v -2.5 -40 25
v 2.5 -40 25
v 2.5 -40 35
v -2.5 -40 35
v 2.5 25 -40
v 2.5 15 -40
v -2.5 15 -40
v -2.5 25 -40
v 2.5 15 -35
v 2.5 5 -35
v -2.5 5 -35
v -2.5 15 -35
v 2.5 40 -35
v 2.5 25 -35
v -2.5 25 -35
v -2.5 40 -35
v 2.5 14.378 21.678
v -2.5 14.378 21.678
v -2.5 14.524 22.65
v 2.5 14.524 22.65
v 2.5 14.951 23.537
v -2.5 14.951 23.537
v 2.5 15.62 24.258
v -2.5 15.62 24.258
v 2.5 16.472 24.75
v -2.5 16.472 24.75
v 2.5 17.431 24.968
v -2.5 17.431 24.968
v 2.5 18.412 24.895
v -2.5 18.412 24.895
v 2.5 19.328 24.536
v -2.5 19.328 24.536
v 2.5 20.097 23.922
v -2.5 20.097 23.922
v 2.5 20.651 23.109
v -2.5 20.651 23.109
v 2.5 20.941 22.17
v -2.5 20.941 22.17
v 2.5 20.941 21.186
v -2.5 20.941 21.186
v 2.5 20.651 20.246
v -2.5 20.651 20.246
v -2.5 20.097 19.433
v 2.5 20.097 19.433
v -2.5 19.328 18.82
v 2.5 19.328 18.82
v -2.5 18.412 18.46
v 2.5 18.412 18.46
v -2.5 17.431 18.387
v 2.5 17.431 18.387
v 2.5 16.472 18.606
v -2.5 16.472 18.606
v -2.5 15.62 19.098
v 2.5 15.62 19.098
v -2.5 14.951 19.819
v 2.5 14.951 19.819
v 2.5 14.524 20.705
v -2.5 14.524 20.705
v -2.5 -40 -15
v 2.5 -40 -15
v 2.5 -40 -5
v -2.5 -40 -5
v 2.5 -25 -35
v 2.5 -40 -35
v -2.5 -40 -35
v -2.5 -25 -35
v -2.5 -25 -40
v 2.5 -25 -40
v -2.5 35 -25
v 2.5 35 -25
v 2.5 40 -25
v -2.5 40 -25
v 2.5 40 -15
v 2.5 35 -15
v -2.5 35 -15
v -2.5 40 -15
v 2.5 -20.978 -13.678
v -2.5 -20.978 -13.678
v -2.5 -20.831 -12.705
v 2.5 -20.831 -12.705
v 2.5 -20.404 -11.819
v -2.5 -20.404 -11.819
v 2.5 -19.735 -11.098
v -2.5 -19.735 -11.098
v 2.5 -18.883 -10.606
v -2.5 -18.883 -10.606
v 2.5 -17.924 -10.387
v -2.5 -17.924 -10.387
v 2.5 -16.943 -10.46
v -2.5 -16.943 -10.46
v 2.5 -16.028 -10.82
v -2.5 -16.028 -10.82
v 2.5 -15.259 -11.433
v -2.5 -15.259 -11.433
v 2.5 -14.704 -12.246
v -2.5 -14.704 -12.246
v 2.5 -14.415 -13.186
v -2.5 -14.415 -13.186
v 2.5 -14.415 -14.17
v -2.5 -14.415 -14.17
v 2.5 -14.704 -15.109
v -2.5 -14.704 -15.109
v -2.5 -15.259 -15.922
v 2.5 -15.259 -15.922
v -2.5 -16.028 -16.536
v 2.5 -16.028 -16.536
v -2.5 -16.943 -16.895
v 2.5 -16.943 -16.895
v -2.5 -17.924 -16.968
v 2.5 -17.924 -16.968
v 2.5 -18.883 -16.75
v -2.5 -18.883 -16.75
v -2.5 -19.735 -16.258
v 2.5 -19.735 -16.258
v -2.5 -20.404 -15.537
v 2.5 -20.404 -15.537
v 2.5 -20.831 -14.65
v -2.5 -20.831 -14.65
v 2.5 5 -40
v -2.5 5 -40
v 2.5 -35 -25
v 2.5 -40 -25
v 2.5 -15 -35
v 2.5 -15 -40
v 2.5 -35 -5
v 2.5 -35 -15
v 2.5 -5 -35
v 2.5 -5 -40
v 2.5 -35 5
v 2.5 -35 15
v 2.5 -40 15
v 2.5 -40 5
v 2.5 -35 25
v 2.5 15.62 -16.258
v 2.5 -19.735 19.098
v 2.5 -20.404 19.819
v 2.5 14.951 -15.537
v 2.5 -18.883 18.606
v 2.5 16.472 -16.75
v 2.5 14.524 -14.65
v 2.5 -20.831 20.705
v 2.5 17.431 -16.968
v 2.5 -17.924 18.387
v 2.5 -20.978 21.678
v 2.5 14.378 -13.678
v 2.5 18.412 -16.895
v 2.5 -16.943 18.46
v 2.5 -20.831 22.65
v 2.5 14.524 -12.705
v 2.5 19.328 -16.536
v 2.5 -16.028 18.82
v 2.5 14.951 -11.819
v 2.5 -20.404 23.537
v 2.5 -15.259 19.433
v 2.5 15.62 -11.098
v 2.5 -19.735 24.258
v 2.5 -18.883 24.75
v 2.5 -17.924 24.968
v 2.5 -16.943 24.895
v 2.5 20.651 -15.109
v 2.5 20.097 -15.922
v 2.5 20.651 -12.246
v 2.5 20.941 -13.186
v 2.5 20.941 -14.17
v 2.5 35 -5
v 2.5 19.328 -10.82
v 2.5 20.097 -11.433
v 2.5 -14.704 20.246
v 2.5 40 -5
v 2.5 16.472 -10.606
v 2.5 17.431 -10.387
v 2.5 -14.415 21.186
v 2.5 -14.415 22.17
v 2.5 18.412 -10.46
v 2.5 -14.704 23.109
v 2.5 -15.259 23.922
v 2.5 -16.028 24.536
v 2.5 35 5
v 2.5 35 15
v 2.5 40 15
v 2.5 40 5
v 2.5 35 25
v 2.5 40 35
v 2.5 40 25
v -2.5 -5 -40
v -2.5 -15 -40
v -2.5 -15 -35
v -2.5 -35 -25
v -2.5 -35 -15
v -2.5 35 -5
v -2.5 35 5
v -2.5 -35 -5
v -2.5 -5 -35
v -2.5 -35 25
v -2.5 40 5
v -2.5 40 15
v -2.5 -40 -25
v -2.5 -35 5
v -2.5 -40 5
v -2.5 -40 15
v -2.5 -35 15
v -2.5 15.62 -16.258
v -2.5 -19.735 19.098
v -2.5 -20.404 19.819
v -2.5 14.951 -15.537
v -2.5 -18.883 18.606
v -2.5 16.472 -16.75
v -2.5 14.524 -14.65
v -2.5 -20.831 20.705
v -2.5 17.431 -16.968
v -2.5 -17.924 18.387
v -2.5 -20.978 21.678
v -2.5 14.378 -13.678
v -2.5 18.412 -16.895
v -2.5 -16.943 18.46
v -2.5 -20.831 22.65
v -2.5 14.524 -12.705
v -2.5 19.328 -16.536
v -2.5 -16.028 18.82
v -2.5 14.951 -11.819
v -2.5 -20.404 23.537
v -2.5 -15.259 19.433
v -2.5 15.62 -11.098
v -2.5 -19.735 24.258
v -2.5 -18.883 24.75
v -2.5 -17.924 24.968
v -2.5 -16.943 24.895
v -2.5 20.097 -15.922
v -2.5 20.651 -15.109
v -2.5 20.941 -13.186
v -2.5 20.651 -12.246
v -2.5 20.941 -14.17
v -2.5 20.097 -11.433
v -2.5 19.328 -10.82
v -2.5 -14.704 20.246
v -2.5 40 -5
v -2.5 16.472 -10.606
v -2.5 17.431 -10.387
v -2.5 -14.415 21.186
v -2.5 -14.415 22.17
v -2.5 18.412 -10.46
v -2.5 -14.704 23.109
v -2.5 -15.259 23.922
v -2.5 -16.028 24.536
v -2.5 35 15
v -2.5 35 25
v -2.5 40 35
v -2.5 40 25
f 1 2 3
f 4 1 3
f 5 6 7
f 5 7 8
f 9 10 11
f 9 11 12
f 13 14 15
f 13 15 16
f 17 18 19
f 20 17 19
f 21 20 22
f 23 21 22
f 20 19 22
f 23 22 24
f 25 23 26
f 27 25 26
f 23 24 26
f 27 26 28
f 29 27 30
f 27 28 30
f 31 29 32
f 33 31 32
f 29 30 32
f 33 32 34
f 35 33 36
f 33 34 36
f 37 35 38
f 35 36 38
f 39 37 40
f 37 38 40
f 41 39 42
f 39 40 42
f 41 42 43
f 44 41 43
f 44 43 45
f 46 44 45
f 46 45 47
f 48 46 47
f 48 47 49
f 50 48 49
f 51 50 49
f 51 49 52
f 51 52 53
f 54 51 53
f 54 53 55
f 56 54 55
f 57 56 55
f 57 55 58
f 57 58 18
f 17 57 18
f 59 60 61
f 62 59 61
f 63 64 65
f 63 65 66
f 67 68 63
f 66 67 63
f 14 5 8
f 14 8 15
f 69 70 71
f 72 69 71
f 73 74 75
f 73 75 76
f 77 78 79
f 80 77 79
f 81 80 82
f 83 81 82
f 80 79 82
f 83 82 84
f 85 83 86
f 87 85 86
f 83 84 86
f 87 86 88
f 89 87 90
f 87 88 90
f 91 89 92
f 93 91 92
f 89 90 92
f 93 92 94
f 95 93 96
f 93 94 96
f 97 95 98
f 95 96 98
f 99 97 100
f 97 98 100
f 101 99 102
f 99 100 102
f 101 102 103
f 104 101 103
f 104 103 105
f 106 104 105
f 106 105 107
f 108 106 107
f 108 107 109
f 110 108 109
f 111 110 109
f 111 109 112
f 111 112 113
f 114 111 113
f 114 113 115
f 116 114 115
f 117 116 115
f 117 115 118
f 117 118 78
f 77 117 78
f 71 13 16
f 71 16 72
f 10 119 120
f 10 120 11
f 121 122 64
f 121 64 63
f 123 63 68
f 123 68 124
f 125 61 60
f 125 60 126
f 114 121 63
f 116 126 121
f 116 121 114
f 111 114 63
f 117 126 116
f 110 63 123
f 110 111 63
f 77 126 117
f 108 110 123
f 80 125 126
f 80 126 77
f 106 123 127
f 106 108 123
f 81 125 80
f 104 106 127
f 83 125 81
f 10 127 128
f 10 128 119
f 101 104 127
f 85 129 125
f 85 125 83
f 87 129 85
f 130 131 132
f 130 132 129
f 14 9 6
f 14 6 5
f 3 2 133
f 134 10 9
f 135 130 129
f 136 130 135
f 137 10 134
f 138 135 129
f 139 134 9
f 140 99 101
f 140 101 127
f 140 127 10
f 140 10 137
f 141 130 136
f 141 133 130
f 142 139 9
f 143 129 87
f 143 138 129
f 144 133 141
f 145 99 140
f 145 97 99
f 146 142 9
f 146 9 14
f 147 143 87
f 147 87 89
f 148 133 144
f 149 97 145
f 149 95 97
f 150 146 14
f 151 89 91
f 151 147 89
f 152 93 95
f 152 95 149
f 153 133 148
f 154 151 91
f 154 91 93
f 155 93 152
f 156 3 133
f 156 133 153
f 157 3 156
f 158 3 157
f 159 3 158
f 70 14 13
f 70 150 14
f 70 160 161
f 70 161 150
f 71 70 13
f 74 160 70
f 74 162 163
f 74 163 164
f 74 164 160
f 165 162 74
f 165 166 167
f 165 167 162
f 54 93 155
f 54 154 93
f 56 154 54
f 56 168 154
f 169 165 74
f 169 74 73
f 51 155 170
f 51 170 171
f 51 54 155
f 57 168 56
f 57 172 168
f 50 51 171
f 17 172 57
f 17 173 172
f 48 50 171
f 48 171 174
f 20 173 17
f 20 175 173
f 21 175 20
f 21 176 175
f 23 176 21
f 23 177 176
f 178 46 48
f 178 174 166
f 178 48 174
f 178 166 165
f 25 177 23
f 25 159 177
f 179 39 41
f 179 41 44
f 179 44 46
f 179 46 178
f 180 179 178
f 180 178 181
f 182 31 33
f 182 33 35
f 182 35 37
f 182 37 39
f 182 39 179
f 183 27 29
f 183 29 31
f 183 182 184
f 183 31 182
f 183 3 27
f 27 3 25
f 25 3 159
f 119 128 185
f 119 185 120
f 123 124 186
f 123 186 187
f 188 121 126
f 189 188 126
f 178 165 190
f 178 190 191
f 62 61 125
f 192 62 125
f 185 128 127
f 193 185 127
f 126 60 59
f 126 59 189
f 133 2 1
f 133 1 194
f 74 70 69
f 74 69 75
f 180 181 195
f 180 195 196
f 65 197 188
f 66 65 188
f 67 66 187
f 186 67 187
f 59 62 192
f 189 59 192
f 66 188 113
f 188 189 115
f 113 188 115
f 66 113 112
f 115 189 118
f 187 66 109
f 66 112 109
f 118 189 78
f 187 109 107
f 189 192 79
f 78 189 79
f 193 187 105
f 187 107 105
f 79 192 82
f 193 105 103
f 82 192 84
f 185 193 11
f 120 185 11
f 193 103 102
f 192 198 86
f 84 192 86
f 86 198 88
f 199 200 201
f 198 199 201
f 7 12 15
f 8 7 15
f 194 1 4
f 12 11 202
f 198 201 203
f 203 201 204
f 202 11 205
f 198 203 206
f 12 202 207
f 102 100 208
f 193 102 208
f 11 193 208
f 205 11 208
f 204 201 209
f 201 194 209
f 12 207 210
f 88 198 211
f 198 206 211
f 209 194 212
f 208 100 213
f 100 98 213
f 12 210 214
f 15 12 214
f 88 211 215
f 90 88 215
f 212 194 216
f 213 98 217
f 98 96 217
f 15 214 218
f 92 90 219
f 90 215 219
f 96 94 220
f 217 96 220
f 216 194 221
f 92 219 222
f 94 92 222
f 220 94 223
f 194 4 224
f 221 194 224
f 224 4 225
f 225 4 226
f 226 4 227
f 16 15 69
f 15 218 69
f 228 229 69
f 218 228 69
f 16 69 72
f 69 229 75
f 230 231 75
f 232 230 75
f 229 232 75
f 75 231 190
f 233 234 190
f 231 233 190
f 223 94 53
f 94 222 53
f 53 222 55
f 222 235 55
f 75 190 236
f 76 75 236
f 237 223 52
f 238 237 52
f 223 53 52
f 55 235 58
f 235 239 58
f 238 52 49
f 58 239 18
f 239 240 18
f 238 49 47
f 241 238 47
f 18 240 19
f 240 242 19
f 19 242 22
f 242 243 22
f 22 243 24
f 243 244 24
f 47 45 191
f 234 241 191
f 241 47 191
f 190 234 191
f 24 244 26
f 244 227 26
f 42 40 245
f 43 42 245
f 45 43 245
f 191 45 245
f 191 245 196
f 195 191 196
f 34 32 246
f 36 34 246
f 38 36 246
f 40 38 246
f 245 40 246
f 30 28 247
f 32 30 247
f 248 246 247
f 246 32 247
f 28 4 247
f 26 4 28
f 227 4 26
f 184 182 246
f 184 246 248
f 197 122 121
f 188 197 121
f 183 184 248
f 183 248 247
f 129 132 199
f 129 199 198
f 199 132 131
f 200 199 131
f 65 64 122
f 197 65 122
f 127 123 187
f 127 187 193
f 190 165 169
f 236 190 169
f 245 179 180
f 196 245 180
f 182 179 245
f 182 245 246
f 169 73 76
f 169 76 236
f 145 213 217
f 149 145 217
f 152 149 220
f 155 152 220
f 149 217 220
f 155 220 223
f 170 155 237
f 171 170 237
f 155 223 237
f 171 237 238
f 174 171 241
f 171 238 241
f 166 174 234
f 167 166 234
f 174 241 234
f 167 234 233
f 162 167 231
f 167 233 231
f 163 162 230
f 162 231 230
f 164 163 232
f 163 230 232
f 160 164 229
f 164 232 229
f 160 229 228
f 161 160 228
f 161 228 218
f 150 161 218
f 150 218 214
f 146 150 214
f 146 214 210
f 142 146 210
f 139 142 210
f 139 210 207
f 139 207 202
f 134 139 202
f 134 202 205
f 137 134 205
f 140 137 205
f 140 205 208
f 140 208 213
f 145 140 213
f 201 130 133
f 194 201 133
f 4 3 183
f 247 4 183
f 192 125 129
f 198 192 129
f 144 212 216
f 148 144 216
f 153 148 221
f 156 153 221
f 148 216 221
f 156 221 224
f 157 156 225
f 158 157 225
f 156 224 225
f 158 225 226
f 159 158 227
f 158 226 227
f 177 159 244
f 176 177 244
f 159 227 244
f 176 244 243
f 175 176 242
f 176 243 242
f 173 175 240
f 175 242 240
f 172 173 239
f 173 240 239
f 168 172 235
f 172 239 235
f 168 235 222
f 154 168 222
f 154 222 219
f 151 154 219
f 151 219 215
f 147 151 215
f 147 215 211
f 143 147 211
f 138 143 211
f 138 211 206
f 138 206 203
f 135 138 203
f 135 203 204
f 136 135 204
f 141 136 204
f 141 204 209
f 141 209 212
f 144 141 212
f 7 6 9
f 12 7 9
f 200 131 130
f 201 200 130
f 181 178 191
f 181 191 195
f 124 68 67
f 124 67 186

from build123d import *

# Parameters (mm, degrees)
F0_W     = 70
F0_H     = 70
F1_DEPTH = 2.5
F2_W     = 10
F2_H     = 5
F3_DEPTH = 5
F4_W     = 5
F4_H     = 10
F5_DEPTH = 5
F7_D     = 6.6


with BuildPart() as f1:
    # F0 (on Right) → F1 (new body, symmetric)
    with BuildSketch(Plane.YZ):
        Rectangle(F0_W, F0_H)
    extrude(amount=F1_DEPTH, both=True)

    # F2 (on face) → F3 (join)
    with BuildSketch(Plane.YZ.offset(2.5)):
        with Locations((-20, -37.5)):
            Rectangle(F2_W, F2_H)
        with Locations((0, -37.5)):
            Rectangle(F2_W, F2_H)
        with Locations((20, -37.5)):
            Rectangle(F2_W, F2_H)
    extrude(amount=-F3_DEPTH)

    # F4 (on face) → F5 (join, through all)
    with BuildSketch(Plane.YZ.offset(2.5)):
        with Locations((-37.5, -30)):
            Rectangle(F4_W, F4_H)
        with Locations((-37.5, -10)):
            Rectangle(F4_W, F4_H)
        with Locations((-37.5, 10)):
            Rectangle(F4_W, F4_H)
        with Locations((-37.5, 30)):
            Rectangle(F4_W, F4_H)
        with Locations((37.5, 30)):
            Rectangle(F4_W, F4_H)
        with Locations((37.5, -30)):
            Rectangle(F4_W, F4_H)
        with Locations((37.5, 10)):
            Rectangle(F4_W, F4_H)
        with Locations((37.5, -10)):
            Rectangle(F4_W, F4_H)
    extrude(amount=-F5_DEPTH)

    # F7 (through all)
    with Locations(Plane.YZ.offset(2.5)):
        with Locations((-17.6776695297, 21.6776695297), (17.6776695297, 21.6776695297), (17.6776695297, -13.6776695297), (-17.6776695297, -13.6776695297)):
            Hole(F7_D / 2)


solid = f1.part
